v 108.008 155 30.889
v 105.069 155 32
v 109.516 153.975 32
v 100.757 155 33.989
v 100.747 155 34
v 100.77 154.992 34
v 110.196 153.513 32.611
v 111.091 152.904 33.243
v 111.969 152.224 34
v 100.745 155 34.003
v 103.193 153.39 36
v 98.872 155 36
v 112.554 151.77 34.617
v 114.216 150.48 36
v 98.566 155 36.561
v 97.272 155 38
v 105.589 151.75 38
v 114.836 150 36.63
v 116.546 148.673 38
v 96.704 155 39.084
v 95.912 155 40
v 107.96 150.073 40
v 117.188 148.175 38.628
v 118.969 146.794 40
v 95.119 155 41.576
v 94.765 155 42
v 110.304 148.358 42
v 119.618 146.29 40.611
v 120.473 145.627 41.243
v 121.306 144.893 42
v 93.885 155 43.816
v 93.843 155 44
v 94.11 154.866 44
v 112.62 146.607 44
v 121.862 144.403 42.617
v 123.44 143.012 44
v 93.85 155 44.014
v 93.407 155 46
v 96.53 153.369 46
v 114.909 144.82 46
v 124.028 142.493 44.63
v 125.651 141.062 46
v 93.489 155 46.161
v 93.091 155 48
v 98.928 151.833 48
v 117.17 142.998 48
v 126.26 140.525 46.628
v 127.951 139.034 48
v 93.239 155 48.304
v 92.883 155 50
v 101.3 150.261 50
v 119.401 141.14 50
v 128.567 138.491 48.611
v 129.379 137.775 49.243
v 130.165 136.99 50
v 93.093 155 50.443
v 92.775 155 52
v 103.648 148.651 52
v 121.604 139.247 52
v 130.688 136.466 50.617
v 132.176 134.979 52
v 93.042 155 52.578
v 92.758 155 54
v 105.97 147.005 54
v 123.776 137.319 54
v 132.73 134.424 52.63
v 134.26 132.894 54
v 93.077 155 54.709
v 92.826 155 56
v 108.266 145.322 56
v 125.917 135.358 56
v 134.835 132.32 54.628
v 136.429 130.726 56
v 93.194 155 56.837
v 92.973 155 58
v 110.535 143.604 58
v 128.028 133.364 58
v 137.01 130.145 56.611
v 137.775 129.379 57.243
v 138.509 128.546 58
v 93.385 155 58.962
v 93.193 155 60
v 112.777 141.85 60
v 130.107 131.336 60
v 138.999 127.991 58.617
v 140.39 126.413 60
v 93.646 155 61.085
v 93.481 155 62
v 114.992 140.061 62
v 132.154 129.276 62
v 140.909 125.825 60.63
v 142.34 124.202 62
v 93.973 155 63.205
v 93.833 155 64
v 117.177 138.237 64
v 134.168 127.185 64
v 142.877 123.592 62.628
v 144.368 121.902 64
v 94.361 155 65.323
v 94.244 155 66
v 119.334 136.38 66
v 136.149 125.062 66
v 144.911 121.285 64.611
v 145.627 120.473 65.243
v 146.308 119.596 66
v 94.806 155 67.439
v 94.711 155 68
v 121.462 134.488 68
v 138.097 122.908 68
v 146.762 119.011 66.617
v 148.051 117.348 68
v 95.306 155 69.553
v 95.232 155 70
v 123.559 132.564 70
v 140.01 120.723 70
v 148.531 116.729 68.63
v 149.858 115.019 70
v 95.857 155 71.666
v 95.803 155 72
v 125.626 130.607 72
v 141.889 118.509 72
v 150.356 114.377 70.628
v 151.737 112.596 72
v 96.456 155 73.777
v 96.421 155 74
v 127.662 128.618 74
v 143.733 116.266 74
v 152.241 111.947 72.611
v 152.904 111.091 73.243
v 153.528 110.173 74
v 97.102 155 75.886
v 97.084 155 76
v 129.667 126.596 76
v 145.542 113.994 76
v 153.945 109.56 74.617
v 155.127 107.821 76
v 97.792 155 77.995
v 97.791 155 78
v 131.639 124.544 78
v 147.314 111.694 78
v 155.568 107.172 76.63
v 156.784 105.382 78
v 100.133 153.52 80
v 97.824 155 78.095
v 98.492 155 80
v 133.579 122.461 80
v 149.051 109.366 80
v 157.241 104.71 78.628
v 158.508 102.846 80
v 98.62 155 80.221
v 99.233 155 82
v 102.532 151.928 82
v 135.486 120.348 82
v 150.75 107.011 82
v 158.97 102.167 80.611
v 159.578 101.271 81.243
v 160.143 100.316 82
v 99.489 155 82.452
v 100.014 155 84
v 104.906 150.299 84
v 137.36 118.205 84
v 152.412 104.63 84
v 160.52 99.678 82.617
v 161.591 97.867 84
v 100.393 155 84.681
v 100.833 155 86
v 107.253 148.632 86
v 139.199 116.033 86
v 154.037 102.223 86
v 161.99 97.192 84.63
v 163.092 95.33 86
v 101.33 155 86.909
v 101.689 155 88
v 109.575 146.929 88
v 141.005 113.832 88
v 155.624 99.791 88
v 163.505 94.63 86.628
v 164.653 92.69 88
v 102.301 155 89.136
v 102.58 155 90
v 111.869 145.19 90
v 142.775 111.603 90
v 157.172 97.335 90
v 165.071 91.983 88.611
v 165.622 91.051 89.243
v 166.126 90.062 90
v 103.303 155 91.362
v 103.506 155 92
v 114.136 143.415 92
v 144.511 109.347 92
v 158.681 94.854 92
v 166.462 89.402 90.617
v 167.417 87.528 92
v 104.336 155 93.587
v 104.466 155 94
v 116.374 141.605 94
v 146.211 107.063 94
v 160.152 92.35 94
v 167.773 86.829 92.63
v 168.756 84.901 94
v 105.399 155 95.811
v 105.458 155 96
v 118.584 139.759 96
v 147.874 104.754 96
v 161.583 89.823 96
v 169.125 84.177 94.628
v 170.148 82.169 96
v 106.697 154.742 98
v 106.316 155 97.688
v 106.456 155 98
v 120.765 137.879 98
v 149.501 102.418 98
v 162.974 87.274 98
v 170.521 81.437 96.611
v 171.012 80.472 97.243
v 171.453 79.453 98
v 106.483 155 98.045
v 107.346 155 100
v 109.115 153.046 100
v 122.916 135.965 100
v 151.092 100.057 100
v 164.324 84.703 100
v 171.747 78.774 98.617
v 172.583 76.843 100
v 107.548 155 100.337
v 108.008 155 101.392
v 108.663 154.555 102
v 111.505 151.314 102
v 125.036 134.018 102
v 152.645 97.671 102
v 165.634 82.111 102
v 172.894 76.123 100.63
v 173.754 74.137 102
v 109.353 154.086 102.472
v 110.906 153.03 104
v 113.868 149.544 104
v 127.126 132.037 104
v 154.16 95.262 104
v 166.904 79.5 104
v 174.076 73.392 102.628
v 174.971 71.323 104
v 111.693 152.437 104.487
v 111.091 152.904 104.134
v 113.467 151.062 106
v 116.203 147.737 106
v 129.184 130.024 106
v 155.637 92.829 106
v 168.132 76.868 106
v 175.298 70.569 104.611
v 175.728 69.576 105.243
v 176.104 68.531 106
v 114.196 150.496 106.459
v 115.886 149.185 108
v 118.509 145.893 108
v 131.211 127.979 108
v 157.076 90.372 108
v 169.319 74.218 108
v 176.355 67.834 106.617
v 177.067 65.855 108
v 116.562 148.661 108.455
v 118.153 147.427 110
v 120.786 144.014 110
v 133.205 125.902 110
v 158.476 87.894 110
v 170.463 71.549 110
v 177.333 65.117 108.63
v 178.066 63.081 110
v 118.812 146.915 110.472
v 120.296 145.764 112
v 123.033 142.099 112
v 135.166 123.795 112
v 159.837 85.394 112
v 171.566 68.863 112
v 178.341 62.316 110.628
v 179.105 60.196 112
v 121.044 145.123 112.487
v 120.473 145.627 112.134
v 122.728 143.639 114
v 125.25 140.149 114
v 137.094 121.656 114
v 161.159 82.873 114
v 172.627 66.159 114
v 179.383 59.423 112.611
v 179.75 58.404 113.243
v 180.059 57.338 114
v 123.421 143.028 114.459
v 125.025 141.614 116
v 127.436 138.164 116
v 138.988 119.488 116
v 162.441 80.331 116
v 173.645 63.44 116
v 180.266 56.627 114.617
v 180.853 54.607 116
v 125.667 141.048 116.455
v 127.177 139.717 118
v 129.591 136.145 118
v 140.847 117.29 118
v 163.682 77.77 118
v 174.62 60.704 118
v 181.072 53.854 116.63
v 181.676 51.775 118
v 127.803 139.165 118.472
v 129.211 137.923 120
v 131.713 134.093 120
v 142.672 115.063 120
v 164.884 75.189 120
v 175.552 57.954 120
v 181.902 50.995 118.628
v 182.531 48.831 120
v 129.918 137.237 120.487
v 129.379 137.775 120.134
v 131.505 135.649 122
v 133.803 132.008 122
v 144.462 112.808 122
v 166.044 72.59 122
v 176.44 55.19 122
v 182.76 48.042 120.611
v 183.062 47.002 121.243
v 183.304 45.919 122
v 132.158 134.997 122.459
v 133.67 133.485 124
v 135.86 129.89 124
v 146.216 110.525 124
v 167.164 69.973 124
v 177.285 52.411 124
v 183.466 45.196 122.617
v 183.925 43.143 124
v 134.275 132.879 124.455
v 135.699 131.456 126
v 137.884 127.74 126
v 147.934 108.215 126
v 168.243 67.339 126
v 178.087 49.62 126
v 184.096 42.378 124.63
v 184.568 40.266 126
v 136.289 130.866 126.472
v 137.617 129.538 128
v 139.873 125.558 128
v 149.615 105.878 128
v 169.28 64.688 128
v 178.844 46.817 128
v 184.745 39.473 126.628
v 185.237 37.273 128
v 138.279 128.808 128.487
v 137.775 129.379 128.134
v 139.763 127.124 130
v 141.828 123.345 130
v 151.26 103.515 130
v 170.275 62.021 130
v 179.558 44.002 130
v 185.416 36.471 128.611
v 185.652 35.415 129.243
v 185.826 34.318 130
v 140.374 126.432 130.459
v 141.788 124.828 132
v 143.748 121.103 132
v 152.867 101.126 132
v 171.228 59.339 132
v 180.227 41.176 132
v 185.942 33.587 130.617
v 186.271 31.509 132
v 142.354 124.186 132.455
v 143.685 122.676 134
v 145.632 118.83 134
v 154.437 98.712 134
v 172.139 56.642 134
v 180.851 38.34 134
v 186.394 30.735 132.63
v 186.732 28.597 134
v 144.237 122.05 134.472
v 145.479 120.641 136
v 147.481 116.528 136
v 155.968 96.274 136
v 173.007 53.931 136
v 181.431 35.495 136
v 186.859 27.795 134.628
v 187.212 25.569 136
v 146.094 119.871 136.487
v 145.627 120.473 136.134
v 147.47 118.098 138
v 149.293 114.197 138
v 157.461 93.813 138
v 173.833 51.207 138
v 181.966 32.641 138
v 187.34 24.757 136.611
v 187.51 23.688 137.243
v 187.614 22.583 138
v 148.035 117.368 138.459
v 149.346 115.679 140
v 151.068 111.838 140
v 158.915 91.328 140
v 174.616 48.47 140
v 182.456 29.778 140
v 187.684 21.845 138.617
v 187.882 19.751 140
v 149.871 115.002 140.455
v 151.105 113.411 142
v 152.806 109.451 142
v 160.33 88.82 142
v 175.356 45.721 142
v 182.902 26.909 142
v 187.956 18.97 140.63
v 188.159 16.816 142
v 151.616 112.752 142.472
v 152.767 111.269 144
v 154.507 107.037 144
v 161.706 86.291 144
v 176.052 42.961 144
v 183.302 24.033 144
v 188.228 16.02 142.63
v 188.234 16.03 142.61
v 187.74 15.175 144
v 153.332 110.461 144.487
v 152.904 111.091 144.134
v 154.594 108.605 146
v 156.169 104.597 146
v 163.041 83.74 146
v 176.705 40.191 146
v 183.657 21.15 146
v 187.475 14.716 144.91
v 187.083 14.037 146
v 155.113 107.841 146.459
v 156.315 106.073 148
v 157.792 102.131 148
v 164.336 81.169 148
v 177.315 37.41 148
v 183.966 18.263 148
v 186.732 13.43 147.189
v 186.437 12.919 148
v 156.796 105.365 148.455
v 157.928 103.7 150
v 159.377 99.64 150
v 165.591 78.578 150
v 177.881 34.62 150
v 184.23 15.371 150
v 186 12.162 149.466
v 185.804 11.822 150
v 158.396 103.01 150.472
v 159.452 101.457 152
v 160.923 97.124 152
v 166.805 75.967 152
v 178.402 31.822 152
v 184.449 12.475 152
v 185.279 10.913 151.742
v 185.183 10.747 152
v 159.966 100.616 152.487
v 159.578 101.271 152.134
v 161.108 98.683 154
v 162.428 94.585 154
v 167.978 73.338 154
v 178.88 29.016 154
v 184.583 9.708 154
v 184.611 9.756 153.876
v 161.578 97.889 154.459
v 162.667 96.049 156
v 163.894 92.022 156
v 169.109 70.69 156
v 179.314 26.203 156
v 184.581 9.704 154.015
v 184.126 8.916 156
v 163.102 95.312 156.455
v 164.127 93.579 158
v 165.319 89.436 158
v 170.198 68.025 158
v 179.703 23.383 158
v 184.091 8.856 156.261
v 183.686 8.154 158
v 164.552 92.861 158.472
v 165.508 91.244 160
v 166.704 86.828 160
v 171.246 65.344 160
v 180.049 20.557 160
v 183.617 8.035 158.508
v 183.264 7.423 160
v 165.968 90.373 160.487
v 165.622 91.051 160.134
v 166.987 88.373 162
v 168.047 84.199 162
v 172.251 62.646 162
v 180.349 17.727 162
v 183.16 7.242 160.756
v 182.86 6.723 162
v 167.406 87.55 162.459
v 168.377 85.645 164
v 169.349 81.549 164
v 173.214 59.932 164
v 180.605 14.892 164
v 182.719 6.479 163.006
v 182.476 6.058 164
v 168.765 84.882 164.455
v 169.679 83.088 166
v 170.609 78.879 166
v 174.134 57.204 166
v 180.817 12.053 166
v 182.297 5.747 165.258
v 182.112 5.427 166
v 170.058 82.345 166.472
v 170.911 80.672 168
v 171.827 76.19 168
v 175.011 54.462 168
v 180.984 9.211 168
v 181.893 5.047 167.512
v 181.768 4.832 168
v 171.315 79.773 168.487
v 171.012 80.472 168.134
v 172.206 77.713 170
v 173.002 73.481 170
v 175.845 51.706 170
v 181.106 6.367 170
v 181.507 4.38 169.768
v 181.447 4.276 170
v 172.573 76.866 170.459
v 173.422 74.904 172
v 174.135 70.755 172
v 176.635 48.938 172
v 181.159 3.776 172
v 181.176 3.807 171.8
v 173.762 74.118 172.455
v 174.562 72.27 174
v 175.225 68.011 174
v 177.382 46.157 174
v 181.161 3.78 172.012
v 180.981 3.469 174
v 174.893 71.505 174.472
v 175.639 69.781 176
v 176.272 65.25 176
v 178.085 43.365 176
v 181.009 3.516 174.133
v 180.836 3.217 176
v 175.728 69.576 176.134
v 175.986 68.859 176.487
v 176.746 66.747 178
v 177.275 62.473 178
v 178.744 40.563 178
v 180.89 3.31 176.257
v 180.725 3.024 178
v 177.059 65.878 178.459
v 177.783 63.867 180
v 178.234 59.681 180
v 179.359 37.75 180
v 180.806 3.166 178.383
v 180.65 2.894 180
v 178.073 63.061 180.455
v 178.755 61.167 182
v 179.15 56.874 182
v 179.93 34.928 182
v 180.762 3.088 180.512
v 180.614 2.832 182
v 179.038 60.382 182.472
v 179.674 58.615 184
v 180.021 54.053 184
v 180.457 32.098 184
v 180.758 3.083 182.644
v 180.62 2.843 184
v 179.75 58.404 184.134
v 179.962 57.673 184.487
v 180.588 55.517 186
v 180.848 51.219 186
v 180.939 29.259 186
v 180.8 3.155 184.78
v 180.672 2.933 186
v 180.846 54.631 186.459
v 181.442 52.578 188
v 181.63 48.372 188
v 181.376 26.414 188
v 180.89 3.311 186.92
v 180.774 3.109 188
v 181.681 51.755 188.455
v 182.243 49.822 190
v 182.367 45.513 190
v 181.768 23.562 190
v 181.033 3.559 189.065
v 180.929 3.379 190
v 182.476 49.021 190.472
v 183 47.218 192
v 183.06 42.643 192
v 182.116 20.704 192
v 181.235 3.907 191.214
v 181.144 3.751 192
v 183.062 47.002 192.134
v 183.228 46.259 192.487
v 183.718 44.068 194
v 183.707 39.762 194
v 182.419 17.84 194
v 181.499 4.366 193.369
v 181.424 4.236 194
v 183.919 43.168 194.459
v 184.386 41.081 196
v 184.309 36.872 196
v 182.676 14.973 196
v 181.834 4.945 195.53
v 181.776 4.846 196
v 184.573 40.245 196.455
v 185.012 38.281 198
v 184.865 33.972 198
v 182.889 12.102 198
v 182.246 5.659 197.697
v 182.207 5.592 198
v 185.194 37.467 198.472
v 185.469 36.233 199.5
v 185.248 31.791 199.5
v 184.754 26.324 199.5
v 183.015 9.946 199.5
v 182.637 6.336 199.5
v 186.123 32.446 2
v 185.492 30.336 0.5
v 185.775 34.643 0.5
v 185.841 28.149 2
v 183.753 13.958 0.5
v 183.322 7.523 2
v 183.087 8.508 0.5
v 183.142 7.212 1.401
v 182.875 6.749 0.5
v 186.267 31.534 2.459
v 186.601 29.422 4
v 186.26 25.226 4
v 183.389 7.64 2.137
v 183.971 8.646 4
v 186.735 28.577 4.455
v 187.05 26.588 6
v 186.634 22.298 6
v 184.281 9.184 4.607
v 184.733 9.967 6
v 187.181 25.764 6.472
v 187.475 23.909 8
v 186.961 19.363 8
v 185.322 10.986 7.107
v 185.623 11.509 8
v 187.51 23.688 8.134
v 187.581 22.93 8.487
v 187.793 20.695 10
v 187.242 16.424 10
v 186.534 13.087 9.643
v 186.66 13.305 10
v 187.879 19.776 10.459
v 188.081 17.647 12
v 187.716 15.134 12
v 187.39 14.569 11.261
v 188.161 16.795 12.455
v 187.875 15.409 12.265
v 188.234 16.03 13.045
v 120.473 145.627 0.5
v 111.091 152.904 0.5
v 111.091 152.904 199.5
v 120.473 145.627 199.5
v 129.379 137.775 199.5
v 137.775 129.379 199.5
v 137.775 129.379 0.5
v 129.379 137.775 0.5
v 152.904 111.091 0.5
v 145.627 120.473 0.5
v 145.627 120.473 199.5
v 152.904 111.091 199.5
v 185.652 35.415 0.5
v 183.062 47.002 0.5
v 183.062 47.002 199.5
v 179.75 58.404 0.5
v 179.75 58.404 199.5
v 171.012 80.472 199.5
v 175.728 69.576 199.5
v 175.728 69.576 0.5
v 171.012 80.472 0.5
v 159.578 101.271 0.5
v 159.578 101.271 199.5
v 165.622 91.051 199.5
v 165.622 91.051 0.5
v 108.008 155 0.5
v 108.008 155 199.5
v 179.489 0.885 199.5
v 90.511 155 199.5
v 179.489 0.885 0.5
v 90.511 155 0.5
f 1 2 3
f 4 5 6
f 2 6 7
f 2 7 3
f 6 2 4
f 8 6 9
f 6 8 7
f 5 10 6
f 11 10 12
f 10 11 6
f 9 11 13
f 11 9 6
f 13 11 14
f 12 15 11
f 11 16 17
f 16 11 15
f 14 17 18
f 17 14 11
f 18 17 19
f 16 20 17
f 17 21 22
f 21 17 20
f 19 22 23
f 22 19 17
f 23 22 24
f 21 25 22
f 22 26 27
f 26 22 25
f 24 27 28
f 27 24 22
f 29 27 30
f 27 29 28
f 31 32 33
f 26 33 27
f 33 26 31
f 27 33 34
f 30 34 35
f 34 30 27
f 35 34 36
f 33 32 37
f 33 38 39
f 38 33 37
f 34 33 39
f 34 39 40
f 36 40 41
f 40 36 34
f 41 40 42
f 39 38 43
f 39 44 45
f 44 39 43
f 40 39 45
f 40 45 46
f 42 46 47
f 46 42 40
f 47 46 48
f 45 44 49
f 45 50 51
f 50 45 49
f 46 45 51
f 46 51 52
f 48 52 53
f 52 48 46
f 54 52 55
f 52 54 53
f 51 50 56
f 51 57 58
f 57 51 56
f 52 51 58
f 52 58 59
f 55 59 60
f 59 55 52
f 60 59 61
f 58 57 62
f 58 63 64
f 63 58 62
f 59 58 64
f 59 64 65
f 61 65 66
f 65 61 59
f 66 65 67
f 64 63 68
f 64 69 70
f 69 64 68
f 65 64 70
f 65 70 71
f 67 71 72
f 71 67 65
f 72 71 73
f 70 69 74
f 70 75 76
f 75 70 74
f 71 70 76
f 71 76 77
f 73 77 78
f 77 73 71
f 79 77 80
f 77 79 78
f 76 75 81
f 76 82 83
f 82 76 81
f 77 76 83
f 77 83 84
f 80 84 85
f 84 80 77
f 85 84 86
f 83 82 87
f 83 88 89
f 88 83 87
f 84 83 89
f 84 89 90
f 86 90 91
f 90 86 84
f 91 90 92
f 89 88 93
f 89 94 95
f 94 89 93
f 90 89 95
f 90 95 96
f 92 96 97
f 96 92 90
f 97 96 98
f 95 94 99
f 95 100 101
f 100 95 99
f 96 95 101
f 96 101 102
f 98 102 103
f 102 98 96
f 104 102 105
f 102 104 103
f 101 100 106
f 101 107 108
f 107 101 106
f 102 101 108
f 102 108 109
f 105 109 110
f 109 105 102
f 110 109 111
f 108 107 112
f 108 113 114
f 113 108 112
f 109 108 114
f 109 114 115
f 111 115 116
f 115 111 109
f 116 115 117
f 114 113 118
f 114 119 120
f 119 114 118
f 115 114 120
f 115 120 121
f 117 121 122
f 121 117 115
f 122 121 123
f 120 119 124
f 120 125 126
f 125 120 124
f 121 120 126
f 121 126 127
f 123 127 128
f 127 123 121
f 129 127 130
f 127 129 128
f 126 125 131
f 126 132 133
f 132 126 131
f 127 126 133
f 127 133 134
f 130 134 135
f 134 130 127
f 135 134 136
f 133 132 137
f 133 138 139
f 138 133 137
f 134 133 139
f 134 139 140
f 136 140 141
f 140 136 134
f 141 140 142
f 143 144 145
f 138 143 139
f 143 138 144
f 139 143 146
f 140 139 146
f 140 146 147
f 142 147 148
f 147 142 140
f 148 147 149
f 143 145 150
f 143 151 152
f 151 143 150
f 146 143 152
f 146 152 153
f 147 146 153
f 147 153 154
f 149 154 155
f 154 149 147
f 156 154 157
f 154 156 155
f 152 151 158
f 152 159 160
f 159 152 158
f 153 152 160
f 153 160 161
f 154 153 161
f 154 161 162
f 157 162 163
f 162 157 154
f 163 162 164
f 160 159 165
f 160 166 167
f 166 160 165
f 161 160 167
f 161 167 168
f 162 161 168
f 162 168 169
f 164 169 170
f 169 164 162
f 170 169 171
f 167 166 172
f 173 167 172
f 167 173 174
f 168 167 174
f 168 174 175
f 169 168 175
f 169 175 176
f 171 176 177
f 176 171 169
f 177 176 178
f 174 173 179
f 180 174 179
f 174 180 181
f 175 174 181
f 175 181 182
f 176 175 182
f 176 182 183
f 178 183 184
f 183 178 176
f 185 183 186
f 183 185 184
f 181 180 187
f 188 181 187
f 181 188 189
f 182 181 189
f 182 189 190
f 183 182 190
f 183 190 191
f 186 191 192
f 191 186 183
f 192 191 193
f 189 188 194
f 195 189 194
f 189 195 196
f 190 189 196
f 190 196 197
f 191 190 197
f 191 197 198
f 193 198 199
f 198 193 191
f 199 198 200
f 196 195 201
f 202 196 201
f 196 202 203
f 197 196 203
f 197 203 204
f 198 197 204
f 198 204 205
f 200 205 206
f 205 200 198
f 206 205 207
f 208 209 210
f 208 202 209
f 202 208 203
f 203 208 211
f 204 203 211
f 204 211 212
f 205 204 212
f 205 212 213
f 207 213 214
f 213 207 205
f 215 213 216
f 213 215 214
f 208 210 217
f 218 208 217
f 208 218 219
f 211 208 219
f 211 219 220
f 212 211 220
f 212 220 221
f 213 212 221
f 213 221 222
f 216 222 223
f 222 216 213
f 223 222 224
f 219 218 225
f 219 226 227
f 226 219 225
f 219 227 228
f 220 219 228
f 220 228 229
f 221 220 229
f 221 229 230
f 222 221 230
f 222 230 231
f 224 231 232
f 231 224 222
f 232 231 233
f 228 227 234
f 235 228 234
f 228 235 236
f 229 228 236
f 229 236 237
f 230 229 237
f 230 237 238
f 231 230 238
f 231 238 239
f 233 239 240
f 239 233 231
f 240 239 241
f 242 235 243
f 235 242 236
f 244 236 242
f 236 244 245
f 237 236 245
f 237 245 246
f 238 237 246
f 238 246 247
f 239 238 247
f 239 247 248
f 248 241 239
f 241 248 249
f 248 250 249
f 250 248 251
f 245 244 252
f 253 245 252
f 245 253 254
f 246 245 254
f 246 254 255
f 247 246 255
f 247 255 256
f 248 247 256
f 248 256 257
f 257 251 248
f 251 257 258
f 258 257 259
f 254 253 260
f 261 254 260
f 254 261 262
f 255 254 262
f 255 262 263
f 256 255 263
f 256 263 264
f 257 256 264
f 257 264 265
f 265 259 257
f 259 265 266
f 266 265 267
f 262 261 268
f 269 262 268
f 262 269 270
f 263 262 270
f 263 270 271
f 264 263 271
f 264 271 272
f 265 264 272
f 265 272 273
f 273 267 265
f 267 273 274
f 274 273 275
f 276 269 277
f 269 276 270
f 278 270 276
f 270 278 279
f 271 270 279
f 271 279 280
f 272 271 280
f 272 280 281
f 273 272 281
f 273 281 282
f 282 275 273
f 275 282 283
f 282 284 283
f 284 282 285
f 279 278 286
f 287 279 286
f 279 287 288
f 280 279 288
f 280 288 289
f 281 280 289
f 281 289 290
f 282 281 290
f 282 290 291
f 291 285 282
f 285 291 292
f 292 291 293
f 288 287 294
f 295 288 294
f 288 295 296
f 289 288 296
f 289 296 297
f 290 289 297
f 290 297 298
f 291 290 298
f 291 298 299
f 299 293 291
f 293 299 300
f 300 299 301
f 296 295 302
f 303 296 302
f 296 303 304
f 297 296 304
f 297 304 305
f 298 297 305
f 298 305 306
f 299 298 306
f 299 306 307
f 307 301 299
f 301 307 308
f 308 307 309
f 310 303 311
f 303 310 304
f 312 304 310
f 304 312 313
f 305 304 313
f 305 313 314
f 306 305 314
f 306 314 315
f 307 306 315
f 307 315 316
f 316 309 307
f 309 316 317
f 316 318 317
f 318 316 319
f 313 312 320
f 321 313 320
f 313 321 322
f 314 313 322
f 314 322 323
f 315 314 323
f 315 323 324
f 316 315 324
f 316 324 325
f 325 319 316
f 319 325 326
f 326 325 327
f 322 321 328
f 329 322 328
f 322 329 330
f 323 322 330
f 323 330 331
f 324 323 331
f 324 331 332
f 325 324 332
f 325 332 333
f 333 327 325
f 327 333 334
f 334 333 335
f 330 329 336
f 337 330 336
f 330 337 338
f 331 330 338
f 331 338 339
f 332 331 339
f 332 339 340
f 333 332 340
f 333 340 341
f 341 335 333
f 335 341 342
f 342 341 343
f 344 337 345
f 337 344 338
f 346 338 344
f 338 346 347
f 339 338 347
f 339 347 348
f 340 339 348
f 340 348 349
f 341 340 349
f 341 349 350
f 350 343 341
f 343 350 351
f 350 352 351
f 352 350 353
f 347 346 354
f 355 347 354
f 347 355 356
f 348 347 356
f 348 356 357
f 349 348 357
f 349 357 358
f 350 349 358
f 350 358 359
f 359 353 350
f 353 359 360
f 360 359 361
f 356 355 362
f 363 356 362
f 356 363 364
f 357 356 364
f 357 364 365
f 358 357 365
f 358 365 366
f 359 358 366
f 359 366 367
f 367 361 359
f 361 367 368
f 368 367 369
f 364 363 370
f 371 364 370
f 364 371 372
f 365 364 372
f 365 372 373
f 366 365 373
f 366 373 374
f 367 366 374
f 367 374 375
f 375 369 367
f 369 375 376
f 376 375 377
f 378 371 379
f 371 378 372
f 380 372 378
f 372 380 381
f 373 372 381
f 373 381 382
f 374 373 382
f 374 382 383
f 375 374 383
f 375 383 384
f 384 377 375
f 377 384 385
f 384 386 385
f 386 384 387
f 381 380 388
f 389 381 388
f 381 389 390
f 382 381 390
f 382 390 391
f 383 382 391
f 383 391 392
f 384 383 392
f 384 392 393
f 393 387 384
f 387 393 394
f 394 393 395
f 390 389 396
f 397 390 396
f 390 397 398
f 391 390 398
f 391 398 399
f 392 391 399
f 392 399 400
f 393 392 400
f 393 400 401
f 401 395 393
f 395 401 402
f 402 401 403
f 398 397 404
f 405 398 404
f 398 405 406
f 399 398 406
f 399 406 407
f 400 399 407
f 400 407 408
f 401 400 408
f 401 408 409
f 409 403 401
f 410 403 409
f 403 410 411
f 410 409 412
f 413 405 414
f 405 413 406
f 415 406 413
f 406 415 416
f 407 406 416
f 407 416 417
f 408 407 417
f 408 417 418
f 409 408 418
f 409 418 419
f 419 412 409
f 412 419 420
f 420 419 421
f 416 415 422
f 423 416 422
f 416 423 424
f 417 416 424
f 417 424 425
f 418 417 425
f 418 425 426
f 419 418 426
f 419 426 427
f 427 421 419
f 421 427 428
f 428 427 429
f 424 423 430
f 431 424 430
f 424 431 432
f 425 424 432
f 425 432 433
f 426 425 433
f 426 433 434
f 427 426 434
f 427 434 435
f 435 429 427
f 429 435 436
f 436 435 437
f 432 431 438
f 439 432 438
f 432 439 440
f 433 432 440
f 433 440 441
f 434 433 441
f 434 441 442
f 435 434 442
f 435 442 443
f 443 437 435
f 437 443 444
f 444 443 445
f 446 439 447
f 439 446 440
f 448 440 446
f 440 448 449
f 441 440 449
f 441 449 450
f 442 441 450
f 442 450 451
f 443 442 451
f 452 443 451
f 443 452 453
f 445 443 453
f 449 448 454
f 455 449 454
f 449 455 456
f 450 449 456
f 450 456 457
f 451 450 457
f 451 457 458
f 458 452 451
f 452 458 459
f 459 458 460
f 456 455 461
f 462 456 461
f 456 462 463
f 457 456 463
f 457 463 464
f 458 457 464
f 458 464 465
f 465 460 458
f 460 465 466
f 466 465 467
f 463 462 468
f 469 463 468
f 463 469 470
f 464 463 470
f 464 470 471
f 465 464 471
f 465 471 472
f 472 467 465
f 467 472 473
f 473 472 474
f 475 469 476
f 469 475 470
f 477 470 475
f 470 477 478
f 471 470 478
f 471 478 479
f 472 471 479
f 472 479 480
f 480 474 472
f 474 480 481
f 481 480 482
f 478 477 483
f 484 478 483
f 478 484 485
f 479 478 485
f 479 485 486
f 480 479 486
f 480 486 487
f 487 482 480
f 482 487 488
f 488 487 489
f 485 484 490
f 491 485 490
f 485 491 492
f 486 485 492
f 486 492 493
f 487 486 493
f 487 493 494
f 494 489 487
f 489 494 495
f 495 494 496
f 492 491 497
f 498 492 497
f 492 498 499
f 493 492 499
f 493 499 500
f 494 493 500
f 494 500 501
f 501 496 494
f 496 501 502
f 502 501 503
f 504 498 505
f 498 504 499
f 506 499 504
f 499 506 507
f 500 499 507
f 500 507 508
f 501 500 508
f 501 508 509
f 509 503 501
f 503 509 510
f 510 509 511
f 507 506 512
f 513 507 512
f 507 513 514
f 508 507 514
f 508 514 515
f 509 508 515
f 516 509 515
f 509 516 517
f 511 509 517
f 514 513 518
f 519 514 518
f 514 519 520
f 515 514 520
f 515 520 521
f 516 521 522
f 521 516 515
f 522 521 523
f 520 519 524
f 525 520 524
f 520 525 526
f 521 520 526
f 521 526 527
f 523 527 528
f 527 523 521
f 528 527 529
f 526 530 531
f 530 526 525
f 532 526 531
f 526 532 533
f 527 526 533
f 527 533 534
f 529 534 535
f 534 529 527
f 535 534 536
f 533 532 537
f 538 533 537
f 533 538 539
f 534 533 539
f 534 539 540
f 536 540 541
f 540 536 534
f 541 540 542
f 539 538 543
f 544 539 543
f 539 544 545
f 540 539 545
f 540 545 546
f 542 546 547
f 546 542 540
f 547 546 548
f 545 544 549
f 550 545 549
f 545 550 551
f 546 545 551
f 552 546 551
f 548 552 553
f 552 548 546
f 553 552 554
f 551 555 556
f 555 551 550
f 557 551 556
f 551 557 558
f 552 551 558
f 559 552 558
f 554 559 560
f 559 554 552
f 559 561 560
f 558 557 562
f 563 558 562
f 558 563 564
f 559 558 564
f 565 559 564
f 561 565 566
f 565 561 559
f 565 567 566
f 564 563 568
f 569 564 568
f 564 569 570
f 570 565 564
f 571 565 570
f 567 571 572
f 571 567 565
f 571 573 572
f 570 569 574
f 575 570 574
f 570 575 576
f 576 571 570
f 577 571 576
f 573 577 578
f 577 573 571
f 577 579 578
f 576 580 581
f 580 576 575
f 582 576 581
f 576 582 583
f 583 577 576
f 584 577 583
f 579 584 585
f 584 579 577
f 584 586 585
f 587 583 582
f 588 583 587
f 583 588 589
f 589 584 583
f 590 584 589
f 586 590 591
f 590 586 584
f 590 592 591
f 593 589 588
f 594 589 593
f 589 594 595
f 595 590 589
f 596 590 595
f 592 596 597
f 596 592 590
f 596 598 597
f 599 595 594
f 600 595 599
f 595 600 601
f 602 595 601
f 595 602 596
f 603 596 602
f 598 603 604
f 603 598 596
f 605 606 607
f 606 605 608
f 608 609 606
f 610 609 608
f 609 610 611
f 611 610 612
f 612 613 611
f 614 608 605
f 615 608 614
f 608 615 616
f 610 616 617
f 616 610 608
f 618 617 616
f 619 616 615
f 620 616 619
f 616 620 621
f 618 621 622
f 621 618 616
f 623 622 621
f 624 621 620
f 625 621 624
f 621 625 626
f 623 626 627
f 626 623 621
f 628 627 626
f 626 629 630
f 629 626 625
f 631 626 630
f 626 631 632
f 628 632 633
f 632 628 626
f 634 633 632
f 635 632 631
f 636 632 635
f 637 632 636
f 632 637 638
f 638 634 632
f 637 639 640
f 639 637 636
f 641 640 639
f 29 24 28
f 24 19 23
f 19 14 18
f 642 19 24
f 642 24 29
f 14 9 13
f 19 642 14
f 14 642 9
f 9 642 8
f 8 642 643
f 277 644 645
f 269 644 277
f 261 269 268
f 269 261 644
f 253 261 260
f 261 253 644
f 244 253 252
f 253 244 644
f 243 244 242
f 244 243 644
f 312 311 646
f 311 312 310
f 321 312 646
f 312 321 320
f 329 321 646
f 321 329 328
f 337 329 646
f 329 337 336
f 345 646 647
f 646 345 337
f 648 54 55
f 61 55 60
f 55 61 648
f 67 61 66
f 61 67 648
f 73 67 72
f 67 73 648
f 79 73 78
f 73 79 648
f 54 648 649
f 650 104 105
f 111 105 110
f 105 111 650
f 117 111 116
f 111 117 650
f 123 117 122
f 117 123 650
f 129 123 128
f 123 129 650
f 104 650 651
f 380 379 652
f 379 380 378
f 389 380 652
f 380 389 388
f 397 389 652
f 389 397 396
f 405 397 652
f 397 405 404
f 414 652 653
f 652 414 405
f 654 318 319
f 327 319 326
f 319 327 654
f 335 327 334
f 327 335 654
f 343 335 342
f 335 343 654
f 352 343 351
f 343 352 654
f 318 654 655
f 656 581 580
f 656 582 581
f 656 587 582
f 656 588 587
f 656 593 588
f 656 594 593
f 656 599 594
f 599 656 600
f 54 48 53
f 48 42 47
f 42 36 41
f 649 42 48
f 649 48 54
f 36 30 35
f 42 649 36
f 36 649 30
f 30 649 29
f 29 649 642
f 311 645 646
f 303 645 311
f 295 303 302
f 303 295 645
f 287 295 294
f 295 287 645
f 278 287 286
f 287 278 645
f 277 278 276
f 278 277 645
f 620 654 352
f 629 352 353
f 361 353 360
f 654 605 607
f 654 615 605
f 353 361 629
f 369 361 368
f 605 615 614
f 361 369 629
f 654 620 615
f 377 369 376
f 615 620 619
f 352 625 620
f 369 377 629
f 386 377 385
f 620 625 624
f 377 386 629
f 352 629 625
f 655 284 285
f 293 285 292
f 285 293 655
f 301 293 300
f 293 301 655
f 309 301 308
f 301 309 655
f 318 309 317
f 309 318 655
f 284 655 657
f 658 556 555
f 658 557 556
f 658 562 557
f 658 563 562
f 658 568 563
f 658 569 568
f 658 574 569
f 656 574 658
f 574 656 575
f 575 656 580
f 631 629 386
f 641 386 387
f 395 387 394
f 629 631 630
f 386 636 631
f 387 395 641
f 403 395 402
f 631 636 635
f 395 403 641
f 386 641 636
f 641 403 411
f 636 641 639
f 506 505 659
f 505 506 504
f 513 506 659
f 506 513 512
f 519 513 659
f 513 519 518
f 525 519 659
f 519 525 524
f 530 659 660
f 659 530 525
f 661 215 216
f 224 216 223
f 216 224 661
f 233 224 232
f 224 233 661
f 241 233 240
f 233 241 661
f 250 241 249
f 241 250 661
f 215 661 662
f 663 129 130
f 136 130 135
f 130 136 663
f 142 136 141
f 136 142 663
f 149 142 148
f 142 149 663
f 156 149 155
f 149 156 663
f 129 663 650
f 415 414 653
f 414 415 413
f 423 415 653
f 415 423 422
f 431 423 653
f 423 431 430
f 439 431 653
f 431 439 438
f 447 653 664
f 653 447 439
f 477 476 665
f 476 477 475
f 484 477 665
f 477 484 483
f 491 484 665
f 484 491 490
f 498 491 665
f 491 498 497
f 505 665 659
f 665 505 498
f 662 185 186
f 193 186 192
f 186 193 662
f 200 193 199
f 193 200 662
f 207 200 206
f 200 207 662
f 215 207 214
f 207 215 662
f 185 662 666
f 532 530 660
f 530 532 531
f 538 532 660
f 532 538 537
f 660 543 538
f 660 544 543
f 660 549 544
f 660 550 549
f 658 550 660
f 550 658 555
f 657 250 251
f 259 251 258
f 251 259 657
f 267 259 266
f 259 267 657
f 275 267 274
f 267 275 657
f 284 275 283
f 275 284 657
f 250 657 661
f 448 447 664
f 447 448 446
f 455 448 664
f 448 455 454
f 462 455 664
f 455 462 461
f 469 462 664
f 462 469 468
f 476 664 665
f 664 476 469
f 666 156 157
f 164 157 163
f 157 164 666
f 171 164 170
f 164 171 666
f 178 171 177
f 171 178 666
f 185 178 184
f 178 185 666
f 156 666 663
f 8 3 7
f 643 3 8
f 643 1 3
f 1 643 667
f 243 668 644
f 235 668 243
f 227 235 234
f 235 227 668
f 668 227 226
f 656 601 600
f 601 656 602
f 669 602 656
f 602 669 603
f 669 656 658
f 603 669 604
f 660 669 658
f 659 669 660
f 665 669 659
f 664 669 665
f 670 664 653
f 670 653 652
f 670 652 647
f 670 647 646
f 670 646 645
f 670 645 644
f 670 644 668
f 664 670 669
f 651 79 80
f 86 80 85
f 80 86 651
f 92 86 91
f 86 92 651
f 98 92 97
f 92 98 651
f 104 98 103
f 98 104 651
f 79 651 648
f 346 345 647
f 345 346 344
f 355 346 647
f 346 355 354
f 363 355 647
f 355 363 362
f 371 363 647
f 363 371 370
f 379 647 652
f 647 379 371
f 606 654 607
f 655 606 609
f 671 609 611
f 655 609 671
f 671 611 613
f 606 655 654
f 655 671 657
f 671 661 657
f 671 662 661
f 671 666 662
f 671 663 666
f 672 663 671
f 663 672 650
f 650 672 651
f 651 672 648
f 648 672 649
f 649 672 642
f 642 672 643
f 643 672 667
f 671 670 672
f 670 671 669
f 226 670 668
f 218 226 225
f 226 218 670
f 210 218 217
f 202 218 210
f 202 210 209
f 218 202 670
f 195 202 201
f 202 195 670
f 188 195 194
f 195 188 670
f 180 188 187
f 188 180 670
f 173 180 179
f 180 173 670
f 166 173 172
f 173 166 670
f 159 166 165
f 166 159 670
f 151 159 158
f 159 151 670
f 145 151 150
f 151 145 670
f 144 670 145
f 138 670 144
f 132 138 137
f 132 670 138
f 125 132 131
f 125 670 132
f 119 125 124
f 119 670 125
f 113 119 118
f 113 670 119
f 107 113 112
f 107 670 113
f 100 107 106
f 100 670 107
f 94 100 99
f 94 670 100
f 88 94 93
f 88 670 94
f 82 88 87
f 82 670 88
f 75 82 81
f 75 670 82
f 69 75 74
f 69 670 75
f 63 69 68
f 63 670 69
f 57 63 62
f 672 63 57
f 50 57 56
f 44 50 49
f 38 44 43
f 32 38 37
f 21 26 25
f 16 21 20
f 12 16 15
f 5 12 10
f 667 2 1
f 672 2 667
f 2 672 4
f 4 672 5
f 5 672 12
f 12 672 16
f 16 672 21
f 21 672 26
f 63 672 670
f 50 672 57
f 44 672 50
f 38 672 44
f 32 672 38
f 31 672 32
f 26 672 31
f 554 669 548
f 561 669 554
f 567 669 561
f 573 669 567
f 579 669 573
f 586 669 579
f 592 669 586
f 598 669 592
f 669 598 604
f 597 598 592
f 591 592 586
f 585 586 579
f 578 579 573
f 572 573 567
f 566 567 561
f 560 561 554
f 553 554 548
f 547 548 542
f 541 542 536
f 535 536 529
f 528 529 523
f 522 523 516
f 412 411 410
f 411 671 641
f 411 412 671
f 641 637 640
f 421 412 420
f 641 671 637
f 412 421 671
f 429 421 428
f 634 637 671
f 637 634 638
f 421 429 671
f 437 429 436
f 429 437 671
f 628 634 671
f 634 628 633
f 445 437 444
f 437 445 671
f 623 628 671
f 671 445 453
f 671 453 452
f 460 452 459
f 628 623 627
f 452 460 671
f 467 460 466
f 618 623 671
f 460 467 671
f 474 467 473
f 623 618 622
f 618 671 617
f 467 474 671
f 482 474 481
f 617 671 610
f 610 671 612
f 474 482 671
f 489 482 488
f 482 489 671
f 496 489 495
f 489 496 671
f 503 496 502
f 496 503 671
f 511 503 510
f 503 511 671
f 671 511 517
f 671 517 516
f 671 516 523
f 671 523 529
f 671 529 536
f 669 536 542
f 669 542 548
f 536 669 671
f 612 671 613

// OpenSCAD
intersection() {
difference() {
translate([0,0,100]) {cylinder (r = 189, h = 199, $fn = 100, center = true);}

union() {
linear_extrude(height = 200, twist = 90, $fn = 400) translate([-50,-100,0]){import(file = "wing.dxf", center = false, $fn = 100);} rotate([0,30,0]);

rotate([0,0,90]) {linear_extrude(height = 200, twist = 90, $fn = 400) translate([-50,-100,0]){import(file = "wing.dxf", center = false, $fn = 100);} rotate([0,30,0]);}

rotate([0,0,180]) {linear_extrude(height = 200, twist = 90, $fn = 400) translate([-50,-100,0]){import(file = "wing.dxf", center = false, $fn = 100);} rotate([0,30,0]);}

rotate([0,0,270]) {linear_extrude(height = 200, twist = 90, $fn = 400) translate([-50,-100,0]){import(file = "wing.dxf", center = false, $fn = 100);} rotate([0,30,0]);}
}

cylinder(h = 400, r = 180, center = true, $fn = 6);

translate ([0,175,100]){cube ([400,40,200], center = true);}

rotate([0,0,60]) {translate ([0,175,100]){cube ([400,40,200], center = true);}}

rotate([0,0,120]) {translate ([0,175,100]){cube ([400,40,200], center = true);}}

rotate([0,0,180]) {translate ([0,175,100]){cube ([400,40,200], center = true);}}

rotate([0,0,240]) {translate ([0,175,100]){cube ([400,40,200], center = true);}}
}


rotate([0,0,300]) {translate ([0,175,100]){cube ([400,40,200], center = true);}}
}
